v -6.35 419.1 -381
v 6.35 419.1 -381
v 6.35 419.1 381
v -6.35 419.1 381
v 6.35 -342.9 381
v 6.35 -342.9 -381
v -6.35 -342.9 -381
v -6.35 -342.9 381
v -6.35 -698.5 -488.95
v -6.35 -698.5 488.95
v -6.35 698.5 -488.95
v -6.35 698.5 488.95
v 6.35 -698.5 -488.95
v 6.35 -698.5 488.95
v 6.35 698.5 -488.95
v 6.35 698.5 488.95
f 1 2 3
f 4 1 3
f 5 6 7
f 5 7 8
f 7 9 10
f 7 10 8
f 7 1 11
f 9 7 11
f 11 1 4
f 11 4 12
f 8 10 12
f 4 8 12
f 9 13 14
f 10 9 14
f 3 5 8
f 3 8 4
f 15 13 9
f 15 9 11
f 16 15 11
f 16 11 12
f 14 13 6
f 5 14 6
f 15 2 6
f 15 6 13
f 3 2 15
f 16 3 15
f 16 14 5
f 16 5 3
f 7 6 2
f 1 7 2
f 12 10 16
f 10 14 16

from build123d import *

# Parameters (mm, degrees)
F0_W     = 1397
F0_H     = 977.9
F1_DEPTH = 6.35
F2_W     = 762
F2_H     = 762
F3_DEPTH = 12.701


with BuildPart() as f1:
    # F0 (on Right) → F1 (new body, symmetric)
    with BuildSketch(Plane.YZ):
        Rectangle(F0_W, F0_H)
    extrude(amount=F1_DEPTH, both=True)

    # F2 (on face) → F3 (cut, through all)
    with BuildSketch(Plane.YZ.offset(6.35)):
        with Locations((38.1, 0)):
            Rectangle(F2_W, F2_H)
    extrude(amount=-F3_DEPTH, mode=Mode.SUBTRACT)


solid = f1.part
